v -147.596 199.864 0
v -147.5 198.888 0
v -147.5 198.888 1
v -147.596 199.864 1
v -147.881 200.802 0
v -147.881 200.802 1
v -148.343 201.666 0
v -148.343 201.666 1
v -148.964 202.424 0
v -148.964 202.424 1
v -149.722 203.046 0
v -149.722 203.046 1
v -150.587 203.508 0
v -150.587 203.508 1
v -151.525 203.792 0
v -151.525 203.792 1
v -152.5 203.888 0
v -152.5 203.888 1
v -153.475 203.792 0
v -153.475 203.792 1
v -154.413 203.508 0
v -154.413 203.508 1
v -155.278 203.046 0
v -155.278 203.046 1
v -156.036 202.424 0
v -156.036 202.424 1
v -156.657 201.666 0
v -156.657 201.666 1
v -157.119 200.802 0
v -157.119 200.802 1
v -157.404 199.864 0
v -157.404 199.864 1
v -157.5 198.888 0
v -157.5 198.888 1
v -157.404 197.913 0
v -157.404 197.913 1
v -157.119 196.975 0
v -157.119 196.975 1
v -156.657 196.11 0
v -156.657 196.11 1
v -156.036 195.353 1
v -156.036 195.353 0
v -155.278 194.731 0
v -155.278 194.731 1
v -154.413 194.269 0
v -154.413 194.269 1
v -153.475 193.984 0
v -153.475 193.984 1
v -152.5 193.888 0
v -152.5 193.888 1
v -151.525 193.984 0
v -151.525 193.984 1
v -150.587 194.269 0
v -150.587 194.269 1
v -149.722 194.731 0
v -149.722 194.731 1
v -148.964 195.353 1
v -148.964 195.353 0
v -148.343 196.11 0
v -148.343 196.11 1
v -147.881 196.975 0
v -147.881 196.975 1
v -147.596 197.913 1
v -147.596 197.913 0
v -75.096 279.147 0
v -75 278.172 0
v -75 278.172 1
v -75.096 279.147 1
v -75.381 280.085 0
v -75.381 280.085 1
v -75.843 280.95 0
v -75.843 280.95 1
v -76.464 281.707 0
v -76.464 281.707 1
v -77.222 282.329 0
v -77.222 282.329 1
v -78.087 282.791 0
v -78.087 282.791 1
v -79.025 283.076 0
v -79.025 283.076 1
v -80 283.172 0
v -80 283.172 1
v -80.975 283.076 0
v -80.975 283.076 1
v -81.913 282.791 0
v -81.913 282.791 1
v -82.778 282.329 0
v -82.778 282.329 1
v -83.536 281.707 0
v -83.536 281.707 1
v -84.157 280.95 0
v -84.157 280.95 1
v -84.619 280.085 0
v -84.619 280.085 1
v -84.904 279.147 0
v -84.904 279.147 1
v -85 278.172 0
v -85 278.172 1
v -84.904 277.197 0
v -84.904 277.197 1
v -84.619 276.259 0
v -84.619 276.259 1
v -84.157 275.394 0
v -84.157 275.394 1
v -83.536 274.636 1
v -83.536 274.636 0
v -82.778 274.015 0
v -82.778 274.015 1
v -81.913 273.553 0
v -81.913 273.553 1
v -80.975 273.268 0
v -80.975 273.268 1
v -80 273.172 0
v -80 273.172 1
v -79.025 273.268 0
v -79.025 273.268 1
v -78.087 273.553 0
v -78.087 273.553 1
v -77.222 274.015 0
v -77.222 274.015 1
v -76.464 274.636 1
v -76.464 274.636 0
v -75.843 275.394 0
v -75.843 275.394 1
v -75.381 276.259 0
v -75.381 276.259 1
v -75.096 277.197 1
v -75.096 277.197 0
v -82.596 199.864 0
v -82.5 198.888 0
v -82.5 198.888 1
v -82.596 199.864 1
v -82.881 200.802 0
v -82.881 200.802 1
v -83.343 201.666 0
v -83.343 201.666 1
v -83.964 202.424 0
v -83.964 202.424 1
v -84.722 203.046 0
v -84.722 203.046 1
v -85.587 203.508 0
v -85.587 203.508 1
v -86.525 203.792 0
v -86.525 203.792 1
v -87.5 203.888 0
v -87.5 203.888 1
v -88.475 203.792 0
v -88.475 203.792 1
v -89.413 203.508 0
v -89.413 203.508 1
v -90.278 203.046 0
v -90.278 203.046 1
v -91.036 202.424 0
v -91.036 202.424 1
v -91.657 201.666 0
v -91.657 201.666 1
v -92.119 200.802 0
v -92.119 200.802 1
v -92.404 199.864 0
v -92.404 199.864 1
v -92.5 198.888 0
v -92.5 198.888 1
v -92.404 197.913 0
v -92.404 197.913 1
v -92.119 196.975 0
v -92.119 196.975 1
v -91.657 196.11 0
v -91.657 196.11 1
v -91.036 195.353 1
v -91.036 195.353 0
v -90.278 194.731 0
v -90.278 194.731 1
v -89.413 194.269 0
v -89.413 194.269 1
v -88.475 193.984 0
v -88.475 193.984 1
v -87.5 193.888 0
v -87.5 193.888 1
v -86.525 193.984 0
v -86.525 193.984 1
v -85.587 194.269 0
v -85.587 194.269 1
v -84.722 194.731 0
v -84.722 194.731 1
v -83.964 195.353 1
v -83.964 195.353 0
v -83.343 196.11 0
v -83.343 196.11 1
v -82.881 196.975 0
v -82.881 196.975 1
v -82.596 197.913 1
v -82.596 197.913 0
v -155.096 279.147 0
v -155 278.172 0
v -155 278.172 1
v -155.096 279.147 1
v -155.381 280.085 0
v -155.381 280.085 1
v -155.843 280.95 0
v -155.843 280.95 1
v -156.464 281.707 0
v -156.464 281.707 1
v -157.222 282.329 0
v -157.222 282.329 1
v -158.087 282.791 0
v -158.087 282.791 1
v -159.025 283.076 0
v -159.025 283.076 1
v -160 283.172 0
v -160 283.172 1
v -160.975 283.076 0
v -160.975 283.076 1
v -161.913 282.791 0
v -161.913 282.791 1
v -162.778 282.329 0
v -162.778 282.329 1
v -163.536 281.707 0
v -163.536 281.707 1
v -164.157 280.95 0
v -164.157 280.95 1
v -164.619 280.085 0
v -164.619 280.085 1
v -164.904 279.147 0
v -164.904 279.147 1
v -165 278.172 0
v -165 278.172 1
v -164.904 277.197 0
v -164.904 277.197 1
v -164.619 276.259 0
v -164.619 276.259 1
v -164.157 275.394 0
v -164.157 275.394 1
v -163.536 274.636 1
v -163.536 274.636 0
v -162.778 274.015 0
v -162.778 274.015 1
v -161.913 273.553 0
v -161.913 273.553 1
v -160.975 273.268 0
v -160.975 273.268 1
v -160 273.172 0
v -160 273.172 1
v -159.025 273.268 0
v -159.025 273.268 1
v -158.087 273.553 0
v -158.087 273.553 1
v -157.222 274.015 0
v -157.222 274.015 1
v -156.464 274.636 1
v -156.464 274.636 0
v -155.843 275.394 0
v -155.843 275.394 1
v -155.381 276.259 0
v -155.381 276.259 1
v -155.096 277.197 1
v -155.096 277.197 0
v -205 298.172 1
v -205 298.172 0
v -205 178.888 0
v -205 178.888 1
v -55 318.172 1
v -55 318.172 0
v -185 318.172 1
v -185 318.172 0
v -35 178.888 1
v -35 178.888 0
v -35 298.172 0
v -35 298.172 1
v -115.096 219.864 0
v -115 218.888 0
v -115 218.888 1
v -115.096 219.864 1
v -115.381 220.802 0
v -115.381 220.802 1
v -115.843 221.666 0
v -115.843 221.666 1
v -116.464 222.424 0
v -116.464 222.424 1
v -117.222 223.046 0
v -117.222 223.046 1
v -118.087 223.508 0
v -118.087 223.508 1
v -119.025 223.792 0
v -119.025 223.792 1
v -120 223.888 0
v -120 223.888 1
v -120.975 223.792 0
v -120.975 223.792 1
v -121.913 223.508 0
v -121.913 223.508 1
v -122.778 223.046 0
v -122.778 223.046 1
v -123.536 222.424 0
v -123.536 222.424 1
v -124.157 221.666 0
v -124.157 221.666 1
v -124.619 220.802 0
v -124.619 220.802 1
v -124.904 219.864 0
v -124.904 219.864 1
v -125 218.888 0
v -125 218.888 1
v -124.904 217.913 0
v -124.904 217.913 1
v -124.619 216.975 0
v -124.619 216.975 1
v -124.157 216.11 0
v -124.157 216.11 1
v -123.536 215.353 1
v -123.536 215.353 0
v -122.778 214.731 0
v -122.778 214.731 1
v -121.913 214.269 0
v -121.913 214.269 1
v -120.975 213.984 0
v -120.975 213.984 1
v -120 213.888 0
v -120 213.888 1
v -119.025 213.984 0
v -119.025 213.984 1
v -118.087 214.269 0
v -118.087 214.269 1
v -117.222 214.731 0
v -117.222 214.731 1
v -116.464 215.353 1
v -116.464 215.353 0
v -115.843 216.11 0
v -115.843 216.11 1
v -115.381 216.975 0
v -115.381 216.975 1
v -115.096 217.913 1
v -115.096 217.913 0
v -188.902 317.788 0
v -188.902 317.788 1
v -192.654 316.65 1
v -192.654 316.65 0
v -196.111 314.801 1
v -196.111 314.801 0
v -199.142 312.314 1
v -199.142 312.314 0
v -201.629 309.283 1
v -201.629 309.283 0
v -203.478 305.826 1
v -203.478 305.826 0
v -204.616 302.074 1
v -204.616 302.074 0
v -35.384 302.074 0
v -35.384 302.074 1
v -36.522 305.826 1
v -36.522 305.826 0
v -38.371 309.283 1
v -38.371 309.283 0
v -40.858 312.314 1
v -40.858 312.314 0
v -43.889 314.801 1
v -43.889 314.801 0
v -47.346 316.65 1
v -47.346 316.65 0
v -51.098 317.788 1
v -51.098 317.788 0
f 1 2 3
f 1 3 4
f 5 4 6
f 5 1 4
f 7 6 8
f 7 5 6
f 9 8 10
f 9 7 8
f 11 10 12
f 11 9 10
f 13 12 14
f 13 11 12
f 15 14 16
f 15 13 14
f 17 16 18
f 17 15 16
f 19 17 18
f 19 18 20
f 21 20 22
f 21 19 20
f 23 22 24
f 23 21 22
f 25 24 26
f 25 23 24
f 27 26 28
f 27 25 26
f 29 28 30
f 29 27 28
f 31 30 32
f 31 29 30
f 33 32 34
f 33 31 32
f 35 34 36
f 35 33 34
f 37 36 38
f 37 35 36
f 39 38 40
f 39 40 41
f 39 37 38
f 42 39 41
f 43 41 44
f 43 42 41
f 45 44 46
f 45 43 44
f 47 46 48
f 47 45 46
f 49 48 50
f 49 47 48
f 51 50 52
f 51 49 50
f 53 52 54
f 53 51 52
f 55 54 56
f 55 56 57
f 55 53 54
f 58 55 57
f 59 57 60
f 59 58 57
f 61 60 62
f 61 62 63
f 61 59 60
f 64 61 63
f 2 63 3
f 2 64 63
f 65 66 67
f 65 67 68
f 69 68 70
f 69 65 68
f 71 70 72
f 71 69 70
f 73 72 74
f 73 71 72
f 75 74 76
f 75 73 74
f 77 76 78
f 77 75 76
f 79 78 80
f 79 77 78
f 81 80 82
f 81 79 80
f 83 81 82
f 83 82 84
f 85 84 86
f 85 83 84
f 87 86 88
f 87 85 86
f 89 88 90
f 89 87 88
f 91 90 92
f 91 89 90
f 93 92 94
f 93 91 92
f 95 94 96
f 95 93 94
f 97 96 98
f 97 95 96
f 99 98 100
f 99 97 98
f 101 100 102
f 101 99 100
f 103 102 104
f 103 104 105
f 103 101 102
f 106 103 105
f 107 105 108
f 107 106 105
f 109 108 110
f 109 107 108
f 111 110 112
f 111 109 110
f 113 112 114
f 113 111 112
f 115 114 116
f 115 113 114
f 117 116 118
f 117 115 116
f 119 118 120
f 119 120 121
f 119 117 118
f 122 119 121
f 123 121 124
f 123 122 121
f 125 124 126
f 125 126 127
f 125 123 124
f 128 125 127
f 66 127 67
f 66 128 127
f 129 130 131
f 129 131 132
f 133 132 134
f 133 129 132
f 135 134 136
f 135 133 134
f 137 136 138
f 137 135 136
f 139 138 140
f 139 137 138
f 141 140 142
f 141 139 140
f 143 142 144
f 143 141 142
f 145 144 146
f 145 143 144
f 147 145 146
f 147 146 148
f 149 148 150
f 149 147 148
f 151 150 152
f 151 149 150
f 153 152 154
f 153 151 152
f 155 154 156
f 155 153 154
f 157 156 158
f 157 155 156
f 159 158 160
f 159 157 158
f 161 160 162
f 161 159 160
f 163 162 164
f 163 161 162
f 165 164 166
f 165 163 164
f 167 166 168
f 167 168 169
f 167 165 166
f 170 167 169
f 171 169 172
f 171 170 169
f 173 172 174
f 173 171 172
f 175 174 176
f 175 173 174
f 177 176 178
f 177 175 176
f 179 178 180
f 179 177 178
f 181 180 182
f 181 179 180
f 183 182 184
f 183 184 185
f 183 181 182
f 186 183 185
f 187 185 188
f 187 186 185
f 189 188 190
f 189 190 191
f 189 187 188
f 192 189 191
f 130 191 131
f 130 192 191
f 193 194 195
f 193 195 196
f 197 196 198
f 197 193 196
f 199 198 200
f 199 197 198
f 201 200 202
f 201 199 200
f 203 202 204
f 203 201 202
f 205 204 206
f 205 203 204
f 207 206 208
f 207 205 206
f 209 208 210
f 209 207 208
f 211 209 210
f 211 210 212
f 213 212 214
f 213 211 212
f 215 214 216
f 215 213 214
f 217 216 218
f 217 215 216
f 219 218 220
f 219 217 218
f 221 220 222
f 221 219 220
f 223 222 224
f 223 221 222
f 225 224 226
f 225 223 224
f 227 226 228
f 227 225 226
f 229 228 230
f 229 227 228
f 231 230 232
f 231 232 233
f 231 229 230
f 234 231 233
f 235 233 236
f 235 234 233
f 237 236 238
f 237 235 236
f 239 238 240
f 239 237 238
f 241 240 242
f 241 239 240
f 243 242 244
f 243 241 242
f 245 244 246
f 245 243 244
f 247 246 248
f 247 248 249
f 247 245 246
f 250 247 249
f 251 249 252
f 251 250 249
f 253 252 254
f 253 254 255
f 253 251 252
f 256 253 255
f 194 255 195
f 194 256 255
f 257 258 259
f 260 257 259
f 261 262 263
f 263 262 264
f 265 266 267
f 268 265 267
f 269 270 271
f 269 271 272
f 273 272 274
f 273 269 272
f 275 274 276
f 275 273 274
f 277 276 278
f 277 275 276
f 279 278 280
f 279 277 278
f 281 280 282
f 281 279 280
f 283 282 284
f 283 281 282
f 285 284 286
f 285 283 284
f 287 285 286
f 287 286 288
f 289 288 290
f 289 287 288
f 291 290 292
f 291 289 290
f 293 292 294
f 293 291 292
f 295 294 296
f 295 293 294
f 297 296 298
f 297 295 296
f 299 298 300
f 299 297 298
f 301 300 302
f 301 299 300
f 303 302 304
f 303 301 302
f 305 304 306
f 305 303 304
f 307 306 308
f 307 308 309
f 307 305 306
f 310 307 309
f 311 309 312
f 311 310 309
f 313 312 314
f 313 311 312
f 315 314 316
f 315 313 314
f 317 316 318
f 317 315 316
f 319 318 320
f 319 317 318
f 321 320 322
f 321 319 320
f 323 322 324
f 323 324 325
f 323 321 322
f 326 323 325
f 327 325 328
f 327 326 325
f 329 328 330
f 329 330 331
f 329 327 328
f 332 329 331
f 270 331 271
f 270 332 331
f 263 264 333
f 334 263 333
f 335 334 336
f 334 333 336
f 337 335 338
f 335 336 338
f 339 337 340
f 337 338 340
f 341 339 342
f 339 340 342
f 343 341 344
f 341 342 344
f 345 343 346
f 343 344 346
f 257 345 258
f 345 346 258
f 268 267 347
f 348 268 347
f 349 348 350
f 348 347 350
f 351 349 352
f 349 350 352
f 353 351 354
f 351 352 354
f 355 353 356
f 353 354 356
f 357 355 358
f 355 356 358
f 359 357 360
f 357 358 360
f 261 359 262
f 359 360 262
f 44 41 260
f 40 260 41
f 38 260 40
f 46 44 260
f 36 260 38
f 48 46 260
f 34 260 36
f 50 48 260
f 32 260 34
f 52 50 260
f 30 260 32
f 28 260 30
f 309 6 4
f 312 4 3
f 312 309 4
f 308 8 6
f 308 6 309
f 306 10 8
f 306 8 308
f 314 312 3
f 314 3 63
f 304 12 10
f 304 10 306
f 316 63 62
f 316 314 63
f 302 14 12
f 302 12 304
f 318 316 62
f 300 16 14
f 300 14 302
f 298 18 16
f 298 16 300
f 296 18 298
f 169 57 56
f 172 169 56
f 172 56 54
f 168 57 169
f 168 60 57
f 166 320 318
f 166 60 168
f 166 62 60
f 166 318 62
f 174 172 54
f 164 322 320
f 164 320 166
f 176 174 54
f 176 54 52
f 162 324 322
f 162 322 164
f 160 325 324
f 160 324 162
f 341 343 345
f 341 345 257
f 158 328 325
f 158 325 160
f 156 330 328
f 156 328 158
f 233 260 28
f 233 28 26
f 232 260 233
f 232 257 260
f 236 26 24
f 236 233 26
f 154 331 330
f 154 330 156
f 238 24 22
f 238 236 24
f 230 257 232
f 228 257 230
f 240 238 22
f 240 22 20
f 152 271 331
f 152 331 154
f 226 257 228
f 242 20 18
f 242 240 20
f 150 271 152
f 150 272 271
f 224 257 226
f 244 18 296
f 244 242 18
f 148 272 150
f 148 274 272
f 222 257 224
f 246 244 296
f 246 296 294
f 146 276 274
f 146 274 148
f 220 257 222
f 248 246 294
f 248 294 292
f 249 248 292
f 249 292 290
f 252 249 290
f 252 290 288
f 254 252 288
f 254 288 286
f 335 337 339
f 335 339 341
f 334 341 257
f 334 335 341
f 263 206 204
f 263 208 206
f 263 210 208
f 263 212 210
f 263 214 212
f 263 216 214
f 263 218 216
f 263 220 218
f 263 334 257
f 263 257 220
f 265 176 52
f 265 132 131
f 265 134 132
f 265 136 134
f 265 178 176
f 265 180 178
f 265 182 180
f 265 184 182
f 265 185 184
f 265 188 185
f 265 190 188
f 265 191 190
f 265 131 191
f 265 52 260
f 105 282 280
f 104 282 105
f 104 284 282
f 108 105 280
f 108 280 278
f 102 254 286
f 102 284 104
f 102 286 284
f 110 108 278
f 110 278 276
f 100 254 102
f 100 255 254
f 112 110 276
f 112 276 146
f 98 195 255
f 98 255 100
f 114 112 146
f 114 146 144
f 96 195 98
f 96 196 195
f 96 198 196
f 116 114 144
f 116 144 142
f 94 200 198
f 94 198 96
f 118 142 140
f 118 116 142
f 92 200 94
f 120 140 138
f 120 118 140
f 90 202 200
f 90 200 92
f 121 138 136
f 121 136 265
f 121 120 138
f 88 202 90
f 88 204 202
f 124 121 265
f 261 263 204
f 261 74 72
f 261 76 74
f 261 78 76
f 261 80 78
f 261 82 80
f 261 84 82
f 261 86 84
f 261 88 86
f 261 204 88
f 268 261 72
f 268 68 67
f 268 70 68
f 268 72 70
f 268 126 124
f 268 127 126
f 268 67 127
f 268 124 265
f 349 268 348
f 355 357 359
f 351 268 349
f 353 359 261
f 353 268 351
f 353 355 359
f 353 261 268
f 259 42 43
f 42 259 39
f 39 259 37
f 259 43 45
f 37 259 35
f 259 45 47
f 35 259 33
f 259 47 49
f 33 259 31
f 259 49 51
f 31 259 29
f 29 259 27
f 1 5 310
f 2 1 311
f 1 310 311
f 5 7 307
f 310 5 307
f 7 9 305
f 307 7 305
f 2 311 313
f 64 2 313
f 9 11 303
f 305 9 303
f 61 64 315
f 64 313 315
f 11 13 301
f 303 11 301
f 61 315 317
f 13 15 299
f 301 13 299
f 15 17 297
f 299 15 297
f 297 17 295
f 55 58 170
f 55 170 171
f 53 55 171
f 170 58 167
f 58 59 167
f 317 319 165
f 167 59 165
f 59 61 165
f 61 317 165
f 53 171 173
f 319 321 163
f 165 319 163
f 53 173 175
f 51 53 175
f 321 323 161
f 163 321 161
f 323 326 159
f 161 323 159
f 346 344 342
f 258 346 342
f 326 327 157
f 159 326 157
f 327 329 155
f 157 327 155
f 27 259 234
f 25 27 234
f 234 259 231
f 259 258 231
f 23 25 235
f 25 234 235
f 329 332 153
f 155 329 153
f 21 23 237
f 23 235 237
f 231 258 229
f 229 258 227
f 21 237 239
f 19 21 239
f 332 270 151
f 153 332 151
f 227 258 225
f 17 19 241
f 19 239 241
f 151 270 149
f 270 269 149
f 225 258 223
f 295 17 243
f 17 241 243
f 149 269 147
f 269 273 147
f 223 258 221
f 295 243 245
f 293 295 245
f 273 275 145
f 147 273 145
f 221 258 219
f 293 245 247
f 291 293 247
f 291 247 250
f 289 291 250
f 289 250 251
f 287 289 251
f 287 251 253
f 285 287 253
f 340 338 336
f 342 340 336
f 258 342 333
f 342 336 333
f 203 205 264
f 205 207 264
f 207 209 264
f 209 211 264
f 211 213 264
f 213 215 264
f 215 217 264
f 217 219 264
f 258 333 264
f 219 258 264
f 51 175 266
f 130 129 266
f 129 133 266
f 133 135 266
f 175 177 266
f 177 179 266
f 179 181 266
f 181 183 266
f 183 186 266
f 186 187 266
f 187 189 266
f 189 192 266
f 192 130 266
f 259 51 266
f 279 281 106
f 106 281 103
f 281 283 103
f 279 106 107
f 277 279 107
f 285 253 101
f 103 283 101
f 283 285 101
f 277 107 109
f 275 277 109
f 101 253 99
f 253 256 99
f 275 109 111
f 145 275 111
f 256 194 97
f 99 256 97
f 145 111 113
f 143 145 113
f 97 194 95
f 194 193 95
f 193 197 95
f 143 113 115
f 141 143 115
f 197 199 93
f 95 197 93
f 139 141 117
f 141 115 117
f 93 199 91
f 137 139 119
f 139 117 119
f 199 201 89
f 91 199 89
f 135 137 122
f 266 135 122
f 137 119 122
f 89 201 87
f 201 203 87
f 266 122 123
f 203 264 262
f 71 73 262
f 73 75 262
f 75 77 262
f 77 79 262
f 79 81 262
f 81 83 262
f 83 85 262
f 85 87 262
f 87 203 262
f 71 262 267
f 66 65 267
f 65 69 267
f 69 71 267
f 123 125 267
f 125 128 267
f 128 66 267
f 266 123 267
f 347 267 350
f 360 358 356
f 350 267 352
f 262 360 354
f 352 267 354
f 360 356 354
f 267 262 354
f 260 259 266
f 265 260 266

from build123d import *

# Parameters (mm, degrees)
ESBO_O1_R                = 5
RESSALTO_EXTRUS_O1_DEPTH = 1


with BuildPart() as part:
    # Esboço1 → Ressalto-extrusão1 (new body)
    with BuildSketch(Plane.XY):
        with BuildLine():
            Line((-87.5, 318.171952776), (-120, 318.171952776))
            Line((-120, 318.171952776), (-152.5, 318.171952776))
            Line((-152.5, 318.171952776), (-185, 318.171952776))
            ThreePointArc((-185, 318.171952776), (-199.142135624, 312.3140884), (-205, 298.171952776))
            Line((-205, 298.171952776), (-205, 178.888220282))
            Line((-205, 178.888220282), (-35, 178.888220282))
            Line((-35, 178.888220282), (-35, 298.171952776))
            ThreePointArc((-35, 298.171952776), (-40.857864376, 312.3140884), (-55, 318.171952776))
            Line((-55, 318.171952776), (-87.5, 318.171952776))
        make_face()
        with Locations((-152.5, 198.888220282)):
            Circle(ESBO_O1_R, mode=Mode.SUBTRACT)
        with Locations((-87.5, 198.888220282)):
            Circle(ESBO_O1_R, mode=Mode.SUBTRACT)
        with Locations((-120, 218.888220282)):
            Circle(ESBO_O1_R, mode=Mode.SUBTRACT)
        with Locations((-160, 278.171952776)):
            Circle(ESBO_O1_R, mode=Mode.SUBTRACT)
        with Locations((-80, 278.171952776)):
            Circle(ESBO_O1_R, mode=Mode.SUBTRACT)
    extrude(amount=RESSALTO_EXTRUS_O1_DEPTH)


solid = part.part
